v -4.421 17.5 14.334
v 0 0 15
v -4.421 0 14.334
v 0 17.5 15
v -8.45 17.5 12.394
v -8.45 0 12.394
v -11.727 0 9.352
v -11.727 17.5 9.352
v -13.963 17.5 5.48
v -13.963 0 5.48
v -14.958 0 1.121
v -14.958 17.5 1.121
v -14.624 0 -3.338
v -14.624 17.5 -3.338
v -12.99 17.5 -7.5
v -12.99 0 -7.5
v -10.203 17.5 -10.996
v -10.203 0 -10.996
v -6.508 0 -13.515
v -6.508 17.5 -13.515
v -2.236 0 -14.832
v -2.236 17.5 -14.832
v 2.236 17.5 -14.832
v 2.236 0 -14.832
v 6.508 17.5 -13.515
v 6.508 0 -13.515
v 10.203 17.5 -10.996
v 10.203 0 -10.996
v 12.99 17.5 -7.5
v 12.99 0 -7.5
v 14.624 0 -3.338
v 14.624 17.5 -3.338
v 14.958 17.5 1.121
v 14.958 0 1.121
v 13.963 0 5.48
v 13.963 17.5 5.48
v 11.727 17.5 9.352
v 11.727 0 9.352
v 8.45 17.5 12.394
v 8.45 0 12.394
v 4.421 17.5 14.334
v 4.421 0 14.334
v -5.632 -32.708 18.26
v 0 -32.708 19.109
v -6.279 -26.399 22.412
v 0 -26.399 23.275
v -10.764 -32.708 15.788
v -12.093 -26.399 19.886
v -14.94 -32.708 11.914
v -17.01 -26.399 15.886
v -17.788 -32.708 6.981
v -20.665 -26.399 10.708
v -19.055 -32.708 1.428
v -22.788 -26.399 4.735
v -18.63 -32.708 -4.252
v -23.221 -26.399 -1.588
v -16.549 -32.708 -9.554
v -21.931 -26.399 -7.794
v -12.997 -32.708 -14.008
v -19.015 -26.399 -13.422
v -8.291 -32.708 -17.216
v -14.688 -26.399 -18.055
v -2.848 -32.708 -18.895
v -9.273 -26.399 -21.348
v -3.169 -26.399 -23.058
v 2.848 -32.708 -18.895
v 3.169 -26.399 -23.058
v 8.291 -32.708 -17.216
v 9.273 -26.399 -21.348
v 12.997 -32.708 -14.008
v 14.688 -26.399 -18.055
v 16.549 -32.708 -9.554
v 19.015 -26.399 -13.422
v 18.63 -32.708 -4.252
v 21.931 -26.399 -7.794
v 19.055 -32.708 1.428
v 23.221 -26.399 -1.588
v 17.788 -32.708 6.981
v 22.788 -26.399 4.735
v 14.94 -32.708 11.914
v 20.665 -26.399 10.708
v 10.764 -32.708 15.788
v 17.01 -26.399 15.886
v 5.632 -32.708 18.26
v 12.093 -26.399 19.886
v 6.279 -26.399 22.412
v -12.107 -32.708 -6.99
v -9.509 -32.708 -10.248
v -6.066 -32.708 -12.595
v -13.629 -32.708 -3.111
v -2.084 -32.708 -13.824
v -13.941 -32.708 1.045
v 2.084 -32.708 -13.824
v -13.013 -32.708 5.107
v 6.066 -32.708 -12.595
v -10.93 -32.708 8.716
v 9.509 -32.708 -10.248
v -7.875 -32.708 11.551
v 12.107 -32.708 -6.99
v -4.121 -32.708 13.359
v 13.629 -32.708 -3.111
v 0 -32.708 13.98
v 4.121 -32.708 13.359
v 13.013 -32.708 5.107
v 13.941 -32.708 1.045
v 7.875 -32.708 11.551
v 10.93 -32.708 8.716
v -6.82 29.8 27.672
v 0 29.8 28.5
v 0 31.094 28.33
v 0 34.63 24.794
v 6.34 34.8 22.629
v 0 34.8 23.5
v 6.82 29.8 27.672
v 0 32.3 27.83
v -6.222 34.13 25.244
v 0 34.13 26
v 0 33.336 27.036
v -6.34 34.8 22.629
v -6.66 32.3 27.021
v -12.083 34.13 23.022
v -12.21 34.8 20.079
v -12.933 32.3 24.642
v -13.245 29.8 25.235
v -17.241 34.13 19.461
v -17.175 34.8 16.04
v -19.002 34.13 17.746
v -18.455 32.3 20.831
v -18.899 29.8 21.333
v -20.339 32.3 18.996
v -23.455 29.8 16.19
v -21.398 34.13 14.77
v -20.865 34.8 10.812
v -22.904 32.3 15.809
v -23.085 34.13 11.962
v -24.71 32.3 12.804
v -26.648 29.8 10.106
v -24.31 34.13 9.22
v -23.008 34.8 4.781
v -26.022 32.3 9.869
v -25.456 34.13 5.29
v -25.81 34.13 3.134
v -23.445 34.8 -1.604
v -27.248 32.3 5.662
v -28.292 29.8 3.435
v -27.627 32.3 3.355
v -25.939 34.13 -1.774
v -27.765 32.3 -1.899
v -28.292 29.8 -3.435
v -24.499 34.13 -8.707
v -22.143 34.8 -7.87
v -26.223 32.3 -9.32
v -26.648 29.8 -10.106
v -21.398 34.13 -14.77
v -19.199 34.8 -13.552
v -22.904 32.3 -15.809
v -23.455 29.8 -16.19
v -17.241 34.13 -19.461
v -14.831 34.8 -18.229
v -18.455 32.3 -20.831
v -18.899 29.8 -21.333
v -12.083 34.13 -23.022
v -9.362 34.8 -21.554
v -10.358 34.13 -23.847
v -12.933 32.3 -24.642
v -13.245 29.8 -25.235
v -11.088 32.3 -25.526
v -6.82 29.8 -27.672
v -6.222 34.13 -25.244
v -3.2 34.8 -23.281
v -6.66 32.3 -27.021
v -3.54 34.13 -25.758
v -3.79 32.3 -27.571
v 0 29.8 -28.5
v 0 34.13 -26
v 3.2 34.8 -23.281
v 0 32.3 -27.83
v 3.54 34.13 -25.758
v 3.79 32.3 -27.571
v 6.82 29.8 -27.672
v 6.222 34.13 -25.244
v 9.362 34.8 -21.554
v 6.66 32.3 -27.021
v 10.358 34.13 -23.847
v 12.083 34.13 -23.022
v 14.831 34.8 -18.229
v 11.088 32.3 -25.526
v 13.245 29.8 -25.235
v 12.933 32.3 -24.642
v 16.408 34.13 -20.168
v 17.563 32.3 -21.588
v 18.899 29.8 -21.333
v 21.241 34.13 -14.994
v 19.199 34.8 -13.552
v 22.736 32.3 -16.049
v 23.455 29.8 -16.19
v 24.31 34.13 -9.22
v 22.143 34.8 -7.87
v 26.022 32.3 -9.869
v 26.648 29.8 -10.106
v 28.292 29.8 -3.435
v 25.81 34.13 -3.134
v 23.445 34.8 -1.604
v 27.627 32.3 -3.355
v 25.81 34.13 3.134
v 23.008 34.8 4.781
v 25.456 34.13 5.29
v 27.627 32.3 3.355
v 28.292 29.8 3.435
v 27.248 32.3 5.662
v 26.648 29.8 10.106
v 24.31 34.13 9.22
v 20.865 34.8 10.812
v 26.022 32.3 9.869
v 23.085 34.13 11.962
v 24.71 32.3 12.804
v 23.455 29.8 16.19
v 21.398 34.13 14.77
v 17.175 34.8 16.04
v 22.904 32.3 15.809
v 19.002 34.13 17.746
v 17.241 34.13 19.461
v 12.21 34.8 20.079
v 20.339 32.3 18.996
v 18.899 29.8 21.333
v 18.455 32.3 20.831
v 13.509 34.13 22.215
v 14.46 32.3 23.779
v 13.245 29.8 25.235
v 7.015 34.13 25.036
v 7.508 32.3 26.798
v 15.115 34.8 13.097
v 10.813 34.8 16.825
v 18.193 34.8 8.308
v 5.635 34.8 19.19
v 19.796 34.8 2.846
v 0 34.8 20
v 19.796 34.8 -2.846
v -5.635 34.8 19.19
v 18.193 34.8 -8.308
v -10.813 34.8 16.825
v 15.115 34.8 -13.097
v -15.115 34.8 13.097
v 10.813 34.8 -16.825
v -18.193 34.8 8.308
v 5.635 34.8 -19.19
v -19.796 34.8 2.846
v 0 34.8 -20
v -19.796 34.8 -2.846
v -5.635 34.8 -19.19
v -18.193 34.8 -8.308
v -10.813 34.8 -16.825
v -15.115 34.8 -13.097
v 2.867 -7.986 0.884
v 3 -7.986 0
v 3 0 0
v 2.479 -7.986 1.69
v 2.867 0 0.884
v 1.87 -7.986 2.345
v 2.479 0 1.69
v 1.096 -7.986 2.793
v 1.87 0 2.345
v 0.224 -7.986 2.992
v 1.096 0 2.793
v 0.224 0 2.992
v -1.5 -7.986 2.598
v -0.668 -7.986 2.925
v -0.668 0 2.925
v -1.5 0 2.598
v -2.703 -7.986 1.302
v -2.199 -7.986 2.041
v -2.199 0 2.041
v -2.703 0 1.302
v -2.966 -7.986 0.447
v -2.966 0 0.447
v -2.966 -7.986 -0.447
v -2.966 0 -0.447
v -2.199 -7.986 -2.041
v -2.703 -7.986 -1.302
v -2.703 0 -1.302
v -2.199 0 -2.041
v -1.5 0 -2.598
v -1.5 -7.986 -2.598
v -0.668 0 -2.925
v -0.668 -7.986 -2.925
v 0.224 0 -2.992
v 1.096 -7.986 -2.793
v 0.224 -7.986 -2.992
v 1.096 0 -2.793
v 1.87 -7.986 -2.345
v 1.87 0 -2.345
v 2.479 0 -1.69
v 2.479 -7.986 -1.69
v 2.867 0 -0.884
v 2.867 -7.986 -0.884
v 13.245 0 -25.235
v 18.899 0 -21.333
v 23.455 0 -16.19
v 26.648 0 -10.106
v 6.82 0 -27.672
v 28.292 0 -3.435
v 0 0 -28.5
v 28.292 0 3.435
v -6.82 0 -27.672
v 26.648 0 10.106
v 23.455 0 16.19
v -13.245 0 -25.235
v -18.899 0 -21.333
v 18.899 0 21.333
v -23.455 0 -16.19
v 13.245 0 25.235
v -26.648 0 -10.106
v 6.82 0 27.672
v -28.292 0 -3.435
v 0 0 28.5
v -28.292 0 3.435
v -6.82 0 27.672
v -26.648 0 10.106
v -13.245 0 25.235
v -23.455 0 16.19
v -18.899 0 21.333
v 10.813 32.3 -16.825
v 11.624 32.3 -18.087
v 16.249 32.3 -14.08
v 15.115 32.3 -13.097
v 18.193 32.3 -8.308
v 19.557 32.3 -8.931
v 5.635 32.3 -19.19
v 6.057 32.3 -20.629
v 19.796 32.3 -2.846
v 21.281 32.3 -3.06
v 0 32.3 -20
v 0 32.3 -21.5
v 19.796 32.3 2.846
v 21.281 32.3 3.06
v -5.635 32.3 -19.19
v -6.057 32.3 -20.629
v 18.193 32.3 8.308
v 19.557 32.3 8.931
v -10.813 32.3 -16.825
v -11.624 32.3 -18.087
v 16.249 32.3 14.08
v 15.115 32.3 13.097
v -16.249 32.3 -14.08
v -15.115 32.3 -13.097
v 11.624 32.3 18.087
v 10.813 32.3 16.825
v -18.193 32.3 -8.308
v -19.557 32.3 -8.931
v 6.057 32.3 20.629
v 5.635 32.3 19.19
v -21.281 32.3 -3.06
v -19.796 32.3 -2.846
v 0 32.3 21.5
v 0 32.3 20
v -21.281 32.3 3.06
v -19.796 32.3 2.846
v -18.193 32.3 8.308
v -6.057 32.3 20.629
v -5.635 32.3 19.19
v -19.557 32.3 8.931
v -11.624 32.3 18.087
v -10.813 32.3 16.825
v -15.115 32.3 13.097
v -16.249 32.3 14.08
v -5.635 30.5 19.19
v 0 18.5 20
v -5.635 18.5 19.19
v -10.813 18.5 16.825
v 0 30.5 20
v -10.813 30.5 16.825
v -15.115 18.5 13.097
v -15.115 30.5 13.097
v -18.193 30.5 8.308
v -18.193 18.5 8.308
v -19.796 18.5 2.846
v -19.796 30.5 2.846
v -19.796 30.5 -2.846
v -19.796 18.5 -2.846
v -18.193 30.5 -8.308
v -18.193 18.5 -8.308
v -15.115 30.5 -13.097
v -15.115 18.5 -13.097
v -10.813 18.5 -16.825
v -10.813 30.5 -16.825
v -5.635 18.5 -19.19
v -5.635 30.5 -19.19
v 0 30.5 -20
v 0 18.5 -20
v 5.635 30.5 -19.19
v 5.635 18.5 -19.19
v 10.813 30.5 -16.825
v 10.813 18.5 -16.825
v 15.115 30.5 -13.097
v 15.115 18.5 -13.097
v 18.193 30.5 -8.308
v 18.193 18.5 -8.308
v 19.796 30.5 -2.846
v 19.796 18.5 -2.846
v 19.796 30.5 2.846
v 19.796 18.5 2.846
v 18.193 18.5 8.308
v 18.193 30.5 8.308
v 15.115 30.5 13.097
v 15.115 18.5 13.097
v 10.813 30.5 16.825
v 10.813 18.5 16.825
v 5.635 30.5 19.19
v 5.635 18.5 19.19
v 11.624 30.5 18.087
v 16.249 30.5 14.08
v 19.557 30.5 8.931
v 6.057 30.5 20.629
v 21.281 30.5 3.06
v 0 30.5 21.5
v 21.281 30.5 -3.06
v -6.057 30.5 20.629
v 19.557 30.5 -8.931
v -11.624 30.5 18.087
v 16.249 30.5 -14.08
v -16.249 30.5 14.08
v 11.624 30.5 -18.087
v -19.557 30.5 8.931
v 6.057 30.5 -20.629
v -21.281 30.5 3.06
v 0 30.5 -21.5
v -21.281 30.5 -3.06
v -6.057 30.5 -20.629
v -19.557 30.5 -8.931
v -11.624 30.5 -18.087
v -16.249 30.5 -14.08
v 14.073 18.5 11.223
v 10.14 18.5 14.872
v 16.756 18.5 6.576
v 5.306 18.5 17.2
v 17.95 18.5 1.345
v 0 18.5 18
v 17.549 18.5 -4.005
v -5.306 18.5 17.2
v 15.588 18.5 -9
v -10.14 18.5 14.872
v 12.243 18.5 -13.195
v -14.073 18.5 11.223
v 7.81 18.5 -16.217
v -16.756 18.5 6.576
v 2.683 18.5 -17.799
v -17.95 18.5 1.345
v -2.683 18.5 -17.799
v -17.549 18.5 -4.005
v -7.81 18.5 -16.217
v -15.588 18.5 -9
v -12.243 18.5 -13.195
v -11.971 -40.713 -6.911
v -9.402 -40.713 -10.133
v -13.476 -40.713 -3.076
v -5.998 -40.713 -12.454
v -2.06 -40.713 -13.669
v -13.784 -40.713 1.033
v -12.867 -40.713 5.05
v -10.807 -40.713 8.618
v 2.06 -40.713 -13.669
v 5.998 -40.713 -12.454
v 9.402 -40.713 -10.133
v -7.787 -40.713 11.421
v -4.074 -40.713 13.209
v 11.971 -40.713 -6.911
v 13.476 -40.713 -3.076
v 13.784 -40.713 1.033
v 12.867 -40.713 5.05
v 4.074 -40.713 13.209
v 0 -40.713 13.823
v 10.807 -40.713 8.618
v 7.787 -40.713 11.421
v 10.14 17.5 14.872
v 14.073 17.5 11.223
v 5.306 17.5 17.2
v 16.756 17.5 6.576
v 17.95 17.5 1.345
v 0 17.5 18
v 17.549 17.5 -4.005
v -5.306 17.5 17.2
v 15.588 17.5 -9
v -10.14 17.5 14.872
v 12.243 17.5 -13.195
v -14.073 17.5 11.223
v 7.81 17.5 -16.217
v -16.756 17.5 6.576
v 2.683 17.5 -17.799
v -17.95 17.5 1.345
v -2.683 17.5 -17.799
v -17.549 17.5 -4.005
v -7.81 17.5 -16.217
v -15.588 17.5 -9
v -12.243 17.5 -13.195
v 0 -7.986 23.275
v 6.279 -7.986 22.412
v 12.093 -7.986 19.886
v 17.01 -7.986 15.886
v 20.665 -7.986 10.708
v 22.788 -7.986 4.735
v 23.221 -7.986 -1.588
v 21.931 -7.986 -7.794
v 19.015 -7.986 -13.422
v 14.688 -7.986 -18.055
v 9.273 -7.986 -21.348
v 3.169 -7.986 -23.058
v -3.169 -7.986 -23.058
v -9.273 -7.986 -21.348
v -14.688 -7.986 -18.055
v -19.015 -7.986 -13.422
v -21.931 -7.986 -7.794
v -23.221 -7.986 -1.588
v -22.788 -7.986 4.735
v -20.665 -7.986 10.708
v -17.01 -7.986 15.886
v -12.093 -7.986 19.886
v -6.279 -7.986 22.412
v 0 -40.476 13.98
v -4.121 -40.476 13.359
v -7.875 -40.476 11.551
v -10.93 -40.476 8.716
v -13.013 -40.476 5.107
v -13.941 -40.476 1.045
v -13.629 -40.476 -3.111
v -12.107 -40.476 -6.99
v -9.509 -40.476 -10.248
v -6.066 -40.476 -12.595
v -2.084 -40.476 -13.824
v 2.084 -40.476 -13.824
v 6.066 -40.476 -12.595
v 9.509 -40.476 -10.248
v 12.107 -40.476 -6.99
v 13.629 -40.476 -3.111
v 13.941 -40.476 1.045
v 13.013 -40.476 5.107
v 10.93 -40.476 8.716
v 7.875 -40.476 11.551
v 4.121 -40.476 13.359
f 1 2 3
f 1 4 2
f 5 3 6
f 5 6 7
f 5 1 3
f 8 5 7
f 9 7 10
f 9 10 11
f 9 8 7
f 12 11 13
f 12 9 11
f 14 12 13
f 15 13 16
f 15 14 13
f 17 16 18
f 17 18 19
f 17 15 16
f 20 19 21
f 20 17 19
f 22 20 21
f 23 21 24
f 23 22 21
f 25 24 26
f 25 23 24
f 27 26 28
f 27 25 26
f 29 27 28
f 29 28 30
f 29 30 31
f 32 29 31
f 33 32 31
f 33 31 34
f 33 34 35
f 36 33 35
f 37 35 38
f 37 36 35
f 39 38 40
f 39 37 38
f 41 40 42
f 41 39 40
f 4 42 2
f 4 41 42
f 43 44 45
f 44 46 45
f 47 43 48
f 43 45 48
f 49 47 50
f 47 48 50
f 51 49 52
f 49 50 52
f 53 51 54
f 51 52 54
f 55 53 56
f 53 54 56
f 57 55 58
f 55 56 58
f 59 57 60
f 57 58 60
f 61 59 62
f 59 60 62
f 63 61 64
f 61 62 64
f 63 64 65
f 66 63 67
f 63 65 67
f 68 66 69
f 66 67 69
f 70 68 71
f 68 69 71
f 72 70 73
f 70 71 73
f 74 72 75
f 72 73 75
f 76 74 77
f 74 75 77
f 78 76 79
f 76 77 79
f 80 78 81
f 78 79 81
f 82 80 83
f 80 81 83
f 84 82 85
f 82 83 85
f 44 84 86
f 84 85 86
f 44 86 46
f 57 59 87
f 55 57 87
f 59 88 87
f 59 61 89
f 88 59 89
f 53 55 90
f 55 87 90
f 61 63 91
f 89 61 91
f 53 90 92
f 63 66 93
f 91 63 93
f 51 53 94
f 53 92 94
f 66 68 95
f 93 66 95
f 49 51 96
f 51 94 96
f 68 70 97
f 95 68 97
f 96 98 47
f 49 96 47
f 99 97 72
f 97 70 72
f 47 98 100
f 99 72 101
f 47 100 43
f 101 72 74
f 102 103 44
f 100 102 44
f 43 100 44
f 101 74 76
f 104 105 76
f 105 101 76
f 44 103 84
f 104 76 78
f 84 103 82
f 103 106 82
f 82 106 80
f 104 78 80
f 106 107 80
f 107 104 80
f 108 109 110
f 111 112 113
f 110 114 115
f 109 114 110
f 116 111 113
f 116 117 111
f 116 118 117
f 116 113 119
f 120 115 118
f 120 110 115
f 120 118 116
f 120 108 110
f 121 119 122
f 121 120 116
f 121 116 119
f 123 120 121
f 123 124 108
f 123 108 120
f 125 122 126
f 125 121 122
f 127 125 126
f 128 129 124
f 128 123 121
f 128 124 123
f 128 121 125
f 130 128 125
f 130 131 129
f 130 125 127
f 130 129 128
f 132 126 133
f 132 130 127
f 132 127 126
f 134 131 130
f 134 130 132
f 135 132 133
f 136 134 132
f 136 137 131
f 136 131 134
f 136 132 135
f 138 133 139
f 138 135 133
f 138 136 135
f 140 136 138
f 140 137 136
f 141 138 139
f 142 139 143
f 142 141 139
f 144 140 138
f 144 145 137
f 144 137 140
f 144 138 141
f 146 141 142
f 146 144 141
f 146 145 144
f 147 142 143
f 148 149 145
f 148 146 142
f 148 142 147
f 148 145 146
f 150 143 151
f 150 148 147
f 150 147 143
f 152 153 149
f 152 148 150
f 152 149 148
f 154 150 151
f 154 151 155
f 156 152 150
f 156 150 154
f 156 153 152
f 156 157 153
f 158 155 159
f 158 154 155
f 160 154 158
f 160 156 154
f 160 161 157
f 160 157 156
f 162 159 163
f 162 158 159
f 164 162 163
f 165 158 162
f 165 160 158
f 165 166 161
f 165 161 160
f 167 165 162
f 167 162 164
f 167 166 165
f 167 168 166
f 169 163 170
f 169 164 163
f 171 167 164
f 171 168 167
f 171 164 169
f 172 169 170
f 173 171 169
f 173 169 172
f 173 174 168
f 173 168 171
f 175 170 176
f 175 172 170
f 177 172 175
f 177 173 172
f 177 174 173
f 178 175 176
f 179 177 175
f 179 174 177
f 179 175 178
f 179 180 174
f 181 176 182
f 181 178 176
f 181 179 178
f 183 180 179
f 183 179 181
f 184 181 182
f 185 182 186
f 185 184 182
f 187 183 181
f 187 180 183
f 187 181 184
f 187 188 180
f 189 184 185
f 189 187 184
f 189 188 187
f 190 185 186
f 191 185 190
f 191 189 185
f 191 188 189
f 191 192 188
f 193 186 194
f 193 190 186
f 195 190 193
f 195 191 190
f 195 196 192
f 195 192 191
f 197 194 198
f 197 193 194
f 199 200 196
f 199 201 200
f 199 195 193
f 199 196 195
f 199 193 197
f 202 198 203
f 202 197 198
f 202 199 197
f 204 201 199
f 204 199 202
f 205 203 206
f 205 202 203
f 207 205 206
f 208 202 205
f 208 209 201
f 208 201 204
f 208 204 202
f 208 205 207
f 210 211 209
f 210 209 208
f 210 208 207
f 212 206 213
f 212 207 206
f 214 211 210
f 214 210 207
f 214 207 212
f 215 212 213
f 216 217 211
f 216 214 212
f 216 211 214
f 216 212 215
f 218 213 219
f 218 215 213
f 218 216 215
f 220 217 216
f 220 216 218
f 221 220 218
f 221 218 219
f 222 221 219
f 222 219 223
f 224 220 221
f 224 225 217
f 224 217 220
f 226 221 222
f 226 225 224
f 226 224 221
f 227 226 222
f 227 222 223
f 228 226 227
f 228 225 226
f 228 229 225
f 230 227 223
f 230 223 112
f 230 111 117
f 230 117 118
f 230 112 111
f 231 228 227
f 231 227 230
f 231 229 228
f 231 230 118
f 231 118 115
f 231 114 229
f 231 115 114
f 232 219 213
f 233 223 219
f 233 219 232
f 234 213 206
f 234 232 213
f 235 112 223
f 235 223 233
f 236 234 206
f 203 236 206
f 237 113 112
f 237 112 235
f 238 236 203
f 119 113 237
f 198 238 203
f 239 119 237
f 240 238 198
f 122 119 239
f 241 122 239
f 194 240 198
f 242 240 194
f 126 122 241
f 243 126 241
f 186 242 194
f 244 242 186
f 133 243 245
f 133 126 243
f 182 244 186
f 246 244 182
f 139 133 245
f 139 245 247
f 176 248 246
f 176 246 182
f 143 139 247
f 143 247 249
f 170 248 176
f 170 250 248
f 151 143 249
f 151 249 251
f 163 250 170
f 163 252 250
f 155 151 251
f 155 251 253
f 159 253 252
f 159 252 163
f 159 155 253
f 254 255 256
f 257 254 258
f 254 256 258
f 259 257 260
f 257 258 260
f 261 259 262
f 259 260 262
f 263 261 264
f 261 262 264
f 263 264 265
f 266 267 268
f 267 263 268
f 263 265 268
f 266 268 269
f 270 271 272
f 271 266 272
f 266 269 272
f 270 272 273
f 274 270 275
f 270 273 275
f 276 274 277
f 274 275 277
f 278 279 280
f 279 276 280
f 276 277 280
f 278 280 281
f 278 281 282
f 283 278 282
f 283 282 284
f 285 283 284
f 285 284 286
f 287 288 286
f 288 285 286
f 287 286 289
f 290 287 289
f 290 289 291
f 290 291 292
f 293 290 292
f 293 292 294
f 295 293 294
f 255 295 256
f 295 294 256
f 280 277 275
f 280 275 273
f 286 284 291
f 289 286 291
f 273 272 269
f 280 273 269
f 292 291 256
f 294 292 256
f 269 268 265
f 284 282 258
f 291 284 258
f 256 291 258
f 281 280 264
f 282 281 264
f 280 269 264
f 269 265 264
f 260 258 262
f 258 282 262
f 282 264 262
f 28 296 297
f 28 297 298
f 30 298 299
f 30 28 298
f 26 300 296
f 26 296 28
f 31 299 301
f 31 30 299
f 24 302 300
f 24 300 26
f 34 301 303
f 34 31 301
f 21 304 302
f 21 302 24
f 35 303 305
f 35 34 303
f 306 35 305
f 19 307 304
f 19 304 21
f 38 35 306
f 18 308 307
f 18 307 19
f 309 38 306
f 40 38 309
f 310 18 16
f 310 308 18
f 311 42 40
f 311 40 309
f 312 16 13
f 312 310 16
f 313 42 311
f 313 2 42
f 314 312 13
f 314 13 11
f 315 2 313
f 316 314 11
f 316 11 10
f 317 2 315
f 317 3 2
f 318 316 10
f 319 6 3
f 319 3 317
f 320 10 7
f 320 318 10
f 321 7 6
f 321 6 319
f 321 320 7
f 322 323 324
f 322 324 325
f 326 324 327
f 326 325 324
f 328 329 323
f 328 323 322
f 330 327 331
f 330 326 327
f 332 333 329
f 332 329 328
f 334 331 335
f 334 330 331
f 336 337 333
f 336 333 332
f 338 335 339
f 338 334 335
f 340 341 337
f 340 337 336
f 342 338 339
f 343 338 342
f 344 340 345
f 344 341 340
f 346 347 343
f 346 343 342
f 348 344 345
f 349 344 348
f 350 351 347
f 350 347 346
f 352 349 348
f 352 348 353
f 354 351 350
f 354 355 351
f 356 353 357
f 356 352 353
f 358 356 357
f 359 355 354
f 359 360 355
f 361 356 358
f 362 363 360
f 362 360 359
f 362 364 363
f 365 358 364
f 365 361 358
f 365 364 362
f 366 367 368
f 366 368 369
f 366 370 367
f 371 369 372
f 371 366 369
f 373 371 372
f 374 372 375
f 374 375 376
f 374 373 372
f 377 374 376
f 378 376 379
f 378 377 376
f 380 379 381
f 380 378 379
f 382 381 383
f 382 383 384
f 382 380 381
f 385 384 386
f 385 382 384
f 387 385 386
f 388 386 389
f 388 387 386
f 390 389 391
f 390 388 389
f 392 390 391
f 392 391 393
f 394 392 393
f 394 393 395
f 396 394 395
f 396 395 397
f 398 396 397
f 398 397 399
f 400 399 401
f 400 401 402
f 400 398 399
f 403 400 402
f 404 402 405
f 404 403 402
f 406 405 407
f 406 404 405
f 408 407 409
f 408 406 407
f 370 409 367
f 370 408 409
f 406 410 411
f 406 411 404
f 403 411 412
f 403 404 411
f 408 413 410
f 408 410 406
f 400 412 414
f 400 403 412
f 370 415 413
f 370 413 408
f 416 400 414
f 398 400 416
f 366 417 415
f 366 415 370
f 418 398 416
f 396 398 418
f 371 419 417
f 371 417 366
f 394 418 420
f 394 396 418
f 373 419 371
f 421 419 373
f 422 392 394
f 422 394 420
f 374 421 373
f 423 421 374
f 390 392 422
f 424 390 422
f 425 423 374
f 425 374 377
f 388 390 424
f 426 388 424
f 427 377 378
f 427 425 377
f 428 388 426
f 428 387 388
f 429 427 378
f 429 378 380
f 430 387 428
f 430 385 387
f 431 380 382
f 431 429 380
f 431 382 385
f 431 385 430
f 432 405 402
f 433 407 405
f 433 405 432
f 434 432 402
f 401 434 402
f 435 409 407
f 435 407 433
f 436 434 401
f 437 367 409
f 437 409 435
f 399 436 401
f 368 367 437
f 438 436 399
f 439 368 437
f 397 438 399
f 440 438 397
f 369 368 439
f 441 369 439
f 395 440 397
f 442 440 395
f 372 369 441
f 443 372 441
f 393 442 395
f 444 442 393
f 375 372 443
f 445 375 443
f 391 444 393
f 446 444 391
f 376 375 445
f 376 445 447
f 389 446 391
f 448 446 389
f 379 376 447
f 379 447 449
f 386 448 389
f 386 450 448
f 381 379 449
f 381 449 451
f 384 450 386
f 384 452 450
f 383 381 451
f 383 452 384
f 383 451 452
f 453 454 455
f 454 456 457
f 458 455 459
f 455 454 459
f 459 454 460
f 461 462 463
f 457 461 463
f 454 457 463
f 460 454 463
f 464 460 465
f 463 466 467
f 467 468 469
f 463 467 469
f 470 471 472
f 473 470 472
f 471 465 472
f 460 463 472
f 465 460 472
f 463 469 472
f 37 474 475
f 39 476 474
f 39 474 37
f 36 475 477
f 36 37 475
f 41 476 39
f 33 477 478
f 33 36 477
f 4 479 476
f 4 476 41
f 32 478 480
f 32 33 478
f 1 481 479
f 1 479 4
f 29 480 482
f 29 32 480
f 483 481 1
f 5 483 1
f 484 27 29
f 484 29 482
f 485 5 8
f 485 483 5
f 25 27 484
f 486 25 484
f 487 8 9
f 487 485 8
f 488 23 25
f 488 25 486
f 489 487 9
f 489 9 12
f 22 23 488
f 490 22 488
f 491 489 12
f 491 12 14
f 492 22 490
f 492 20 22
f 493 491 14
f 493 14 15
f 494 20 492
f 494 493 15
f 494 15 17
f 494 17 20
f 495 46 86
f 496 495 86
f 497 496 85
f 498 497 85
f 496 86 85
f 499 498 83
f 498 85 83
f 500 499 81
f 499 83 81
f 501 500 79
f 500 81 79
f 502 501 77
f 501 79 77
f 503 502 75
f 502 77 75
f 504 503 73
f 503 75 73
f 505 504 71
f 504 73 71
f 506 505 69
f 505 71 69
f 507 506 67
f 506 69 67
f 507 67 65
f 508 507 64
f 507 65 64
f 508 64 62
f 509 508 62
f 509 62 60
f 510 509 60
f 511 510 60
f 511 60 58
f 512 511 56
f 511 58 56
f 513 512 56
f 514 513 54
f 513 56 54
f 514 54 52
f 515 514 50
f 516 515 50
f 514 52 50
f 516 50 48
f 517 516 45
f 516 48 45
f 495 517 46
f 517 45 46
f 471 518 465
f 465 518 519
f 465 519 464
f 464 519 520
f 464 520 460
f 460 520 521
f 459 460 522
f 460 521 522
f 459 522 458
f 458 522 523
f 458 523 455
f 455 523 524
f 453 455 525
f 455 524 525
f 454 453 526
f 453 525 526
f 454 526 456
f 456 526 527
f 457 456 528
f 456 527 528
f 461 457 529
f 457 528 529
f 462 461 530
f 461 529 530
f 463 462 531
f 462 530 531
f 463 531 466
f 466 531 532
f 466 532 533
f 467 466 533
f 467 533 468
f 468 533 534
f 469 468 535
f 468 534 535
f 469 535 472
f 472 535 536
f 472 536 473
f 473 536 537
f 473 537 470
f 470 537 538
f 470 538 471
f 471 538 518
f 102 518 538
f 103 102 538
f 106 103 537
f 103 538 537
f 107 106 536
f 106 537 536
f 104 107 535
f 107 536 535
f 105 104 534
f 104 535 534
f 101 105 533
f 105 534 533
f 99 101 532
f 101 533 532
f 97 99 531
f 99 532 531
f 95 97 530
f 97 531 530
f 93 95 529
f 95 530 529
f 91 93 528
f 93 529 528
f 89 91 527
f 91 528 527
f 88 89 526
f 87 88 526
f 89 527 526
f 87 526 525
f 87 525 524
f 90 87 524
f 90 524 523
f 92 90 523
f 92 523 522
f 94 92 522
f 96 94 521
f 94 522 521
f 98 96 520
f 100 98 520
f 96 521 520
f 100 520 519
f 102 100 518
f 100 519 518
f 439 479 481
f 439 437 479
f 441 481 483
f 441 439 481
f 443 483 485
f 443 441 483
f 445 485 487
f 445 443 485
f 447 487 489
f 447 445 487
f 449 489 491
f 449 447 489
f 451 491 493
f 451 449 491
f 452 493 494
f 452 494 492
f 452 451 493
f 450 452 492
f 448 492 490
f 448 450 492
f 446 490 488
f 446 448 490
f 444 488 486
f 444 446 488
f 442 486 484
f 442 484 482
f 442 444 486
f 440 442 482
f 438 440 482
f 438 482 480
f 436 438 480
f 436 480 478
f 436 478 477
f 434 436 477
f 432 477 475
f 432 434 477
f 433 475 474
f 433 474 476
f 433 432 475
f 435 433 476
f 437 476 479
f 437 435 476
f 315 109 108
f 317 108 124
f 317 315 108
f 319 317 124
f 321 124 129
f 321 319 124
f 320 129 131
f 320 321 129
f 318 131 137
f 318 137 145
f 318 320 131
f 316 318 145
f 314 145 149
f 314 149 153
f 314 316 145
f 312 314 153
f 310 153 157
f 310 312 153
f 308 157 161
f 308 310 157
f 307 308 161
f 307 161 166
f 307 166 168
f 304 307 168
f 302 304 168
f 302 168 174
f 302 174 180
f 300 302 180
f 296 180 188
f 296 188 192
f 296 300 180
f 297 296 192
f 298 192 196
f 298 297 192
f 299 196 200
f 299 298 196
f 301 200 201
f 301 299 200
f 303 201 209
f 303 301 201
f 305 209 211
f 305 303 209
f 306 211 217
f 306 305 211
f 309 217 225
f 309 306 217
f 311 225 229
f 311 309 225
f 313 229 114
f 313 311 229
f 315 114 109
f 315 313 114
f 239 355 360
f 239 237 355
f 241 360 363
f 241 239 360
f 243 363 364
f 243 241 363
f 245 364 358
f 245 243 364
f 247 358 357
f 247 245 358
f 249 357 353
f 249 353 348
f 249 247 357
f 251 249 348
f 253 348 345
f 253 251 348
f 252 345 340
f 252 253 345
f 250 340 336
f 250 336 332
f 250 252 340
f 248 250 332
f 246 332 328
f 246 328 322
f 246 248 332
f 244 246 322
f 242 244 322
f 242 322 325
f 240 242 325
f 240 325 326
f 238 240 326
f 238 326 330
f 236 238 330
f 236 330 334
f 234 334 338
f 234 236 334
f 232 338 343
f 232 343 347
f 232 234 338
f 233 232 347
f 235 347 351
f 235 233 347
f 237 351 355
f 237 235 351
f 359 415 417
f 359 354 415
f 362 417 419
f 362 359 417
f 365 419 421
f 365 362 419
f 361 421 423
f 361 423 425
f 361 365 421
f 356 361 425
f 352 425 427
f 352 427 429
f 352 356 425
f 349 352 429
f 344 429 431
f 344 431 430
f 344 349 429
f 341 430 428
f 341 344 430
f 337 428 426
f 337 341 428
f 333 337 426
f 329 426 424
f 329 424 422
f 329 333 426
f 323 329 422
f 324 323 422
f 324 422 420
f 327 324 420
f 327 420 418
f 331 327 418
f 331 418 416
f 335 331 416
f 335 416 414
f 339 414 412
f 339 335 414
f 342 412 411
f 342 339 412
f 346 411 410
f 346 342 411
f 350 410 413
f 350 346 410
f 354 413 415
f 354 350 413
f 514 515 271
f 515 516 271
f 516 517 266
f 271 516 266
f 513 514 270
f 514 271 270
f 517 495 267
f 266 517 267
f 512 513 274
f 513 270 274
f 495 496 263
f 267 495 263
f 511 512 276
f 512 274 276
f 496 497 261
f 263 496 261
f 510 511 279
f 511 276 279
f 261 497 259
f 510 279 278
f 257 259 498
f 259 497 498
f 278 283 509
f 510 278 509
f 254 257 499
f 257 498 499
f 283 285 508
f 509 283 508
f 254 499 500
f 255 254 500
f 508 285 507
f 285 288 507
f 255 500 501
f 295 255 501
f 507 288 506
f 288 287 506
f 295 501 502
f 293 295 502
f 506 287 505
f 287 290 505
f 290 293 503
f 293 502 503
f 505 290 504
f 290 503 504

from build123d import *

# Parameters (mm, degrees)
F0_R     = 3
F1_DEPTH = 20
F8_R     = 5


with BuildPart() as f1:
    # F0 (on Front) → F1 (new body)
    with BuildSketch(Plane.XZ):
        Circle(F0_R)
    extrude(amount=F1_DEPTH)

    # F4 (on Right) → F5 (revolve)
    with BuildSketch(Plane.YZ):
        Polygon((-40.713192, 0), (-7.986492, 0), (-7.986492, 23.274794), (-32.708106, 23.274794), (-32.708106, 13.979694), (-40.713192, 13.979694), align=None)
    revolve(axis=Axis((0, -24.349842, 0), (0, 1, 0)))

    # F6 (on Right) → F7 (revolve, cut)
    with BuildSketch(Plane.YZ):
        Polygon((-42.708106, 12.505719), (-4.846163, 37.505719), (-42.708106, 37.505719), align=None)
    revolve(axis=Axis((0, 0, 0), (0, -1, 0)), mode=Mode.SUBTRACT)


with BuildPart() as f3:
    # F2 (on Right) → F3 (revolve)
    with BuildSketch(Plane.YZ):
        Polygon((0, 28.5), (0, 15), (17.5, 15), (17.5, 18), (18.5, 18), (18.5, 20), (30.5, 20), (30.5, 21.5), (32.3, 21.5), (32.3, 20), (34.8, 20), (34.8, 28.5), align=None)
    revolve(axis=Axis((0, -20, 0), (0, -1, 0)))

    # F8
    f8_edges = [f3.edges().sort_by_distance(p)[0] for p in [
        (0, 34.8, -28.5),
    ]]
    fillet(f8_edges, radius=F8_R)


solid = Compound([f1.part, f3.part])
